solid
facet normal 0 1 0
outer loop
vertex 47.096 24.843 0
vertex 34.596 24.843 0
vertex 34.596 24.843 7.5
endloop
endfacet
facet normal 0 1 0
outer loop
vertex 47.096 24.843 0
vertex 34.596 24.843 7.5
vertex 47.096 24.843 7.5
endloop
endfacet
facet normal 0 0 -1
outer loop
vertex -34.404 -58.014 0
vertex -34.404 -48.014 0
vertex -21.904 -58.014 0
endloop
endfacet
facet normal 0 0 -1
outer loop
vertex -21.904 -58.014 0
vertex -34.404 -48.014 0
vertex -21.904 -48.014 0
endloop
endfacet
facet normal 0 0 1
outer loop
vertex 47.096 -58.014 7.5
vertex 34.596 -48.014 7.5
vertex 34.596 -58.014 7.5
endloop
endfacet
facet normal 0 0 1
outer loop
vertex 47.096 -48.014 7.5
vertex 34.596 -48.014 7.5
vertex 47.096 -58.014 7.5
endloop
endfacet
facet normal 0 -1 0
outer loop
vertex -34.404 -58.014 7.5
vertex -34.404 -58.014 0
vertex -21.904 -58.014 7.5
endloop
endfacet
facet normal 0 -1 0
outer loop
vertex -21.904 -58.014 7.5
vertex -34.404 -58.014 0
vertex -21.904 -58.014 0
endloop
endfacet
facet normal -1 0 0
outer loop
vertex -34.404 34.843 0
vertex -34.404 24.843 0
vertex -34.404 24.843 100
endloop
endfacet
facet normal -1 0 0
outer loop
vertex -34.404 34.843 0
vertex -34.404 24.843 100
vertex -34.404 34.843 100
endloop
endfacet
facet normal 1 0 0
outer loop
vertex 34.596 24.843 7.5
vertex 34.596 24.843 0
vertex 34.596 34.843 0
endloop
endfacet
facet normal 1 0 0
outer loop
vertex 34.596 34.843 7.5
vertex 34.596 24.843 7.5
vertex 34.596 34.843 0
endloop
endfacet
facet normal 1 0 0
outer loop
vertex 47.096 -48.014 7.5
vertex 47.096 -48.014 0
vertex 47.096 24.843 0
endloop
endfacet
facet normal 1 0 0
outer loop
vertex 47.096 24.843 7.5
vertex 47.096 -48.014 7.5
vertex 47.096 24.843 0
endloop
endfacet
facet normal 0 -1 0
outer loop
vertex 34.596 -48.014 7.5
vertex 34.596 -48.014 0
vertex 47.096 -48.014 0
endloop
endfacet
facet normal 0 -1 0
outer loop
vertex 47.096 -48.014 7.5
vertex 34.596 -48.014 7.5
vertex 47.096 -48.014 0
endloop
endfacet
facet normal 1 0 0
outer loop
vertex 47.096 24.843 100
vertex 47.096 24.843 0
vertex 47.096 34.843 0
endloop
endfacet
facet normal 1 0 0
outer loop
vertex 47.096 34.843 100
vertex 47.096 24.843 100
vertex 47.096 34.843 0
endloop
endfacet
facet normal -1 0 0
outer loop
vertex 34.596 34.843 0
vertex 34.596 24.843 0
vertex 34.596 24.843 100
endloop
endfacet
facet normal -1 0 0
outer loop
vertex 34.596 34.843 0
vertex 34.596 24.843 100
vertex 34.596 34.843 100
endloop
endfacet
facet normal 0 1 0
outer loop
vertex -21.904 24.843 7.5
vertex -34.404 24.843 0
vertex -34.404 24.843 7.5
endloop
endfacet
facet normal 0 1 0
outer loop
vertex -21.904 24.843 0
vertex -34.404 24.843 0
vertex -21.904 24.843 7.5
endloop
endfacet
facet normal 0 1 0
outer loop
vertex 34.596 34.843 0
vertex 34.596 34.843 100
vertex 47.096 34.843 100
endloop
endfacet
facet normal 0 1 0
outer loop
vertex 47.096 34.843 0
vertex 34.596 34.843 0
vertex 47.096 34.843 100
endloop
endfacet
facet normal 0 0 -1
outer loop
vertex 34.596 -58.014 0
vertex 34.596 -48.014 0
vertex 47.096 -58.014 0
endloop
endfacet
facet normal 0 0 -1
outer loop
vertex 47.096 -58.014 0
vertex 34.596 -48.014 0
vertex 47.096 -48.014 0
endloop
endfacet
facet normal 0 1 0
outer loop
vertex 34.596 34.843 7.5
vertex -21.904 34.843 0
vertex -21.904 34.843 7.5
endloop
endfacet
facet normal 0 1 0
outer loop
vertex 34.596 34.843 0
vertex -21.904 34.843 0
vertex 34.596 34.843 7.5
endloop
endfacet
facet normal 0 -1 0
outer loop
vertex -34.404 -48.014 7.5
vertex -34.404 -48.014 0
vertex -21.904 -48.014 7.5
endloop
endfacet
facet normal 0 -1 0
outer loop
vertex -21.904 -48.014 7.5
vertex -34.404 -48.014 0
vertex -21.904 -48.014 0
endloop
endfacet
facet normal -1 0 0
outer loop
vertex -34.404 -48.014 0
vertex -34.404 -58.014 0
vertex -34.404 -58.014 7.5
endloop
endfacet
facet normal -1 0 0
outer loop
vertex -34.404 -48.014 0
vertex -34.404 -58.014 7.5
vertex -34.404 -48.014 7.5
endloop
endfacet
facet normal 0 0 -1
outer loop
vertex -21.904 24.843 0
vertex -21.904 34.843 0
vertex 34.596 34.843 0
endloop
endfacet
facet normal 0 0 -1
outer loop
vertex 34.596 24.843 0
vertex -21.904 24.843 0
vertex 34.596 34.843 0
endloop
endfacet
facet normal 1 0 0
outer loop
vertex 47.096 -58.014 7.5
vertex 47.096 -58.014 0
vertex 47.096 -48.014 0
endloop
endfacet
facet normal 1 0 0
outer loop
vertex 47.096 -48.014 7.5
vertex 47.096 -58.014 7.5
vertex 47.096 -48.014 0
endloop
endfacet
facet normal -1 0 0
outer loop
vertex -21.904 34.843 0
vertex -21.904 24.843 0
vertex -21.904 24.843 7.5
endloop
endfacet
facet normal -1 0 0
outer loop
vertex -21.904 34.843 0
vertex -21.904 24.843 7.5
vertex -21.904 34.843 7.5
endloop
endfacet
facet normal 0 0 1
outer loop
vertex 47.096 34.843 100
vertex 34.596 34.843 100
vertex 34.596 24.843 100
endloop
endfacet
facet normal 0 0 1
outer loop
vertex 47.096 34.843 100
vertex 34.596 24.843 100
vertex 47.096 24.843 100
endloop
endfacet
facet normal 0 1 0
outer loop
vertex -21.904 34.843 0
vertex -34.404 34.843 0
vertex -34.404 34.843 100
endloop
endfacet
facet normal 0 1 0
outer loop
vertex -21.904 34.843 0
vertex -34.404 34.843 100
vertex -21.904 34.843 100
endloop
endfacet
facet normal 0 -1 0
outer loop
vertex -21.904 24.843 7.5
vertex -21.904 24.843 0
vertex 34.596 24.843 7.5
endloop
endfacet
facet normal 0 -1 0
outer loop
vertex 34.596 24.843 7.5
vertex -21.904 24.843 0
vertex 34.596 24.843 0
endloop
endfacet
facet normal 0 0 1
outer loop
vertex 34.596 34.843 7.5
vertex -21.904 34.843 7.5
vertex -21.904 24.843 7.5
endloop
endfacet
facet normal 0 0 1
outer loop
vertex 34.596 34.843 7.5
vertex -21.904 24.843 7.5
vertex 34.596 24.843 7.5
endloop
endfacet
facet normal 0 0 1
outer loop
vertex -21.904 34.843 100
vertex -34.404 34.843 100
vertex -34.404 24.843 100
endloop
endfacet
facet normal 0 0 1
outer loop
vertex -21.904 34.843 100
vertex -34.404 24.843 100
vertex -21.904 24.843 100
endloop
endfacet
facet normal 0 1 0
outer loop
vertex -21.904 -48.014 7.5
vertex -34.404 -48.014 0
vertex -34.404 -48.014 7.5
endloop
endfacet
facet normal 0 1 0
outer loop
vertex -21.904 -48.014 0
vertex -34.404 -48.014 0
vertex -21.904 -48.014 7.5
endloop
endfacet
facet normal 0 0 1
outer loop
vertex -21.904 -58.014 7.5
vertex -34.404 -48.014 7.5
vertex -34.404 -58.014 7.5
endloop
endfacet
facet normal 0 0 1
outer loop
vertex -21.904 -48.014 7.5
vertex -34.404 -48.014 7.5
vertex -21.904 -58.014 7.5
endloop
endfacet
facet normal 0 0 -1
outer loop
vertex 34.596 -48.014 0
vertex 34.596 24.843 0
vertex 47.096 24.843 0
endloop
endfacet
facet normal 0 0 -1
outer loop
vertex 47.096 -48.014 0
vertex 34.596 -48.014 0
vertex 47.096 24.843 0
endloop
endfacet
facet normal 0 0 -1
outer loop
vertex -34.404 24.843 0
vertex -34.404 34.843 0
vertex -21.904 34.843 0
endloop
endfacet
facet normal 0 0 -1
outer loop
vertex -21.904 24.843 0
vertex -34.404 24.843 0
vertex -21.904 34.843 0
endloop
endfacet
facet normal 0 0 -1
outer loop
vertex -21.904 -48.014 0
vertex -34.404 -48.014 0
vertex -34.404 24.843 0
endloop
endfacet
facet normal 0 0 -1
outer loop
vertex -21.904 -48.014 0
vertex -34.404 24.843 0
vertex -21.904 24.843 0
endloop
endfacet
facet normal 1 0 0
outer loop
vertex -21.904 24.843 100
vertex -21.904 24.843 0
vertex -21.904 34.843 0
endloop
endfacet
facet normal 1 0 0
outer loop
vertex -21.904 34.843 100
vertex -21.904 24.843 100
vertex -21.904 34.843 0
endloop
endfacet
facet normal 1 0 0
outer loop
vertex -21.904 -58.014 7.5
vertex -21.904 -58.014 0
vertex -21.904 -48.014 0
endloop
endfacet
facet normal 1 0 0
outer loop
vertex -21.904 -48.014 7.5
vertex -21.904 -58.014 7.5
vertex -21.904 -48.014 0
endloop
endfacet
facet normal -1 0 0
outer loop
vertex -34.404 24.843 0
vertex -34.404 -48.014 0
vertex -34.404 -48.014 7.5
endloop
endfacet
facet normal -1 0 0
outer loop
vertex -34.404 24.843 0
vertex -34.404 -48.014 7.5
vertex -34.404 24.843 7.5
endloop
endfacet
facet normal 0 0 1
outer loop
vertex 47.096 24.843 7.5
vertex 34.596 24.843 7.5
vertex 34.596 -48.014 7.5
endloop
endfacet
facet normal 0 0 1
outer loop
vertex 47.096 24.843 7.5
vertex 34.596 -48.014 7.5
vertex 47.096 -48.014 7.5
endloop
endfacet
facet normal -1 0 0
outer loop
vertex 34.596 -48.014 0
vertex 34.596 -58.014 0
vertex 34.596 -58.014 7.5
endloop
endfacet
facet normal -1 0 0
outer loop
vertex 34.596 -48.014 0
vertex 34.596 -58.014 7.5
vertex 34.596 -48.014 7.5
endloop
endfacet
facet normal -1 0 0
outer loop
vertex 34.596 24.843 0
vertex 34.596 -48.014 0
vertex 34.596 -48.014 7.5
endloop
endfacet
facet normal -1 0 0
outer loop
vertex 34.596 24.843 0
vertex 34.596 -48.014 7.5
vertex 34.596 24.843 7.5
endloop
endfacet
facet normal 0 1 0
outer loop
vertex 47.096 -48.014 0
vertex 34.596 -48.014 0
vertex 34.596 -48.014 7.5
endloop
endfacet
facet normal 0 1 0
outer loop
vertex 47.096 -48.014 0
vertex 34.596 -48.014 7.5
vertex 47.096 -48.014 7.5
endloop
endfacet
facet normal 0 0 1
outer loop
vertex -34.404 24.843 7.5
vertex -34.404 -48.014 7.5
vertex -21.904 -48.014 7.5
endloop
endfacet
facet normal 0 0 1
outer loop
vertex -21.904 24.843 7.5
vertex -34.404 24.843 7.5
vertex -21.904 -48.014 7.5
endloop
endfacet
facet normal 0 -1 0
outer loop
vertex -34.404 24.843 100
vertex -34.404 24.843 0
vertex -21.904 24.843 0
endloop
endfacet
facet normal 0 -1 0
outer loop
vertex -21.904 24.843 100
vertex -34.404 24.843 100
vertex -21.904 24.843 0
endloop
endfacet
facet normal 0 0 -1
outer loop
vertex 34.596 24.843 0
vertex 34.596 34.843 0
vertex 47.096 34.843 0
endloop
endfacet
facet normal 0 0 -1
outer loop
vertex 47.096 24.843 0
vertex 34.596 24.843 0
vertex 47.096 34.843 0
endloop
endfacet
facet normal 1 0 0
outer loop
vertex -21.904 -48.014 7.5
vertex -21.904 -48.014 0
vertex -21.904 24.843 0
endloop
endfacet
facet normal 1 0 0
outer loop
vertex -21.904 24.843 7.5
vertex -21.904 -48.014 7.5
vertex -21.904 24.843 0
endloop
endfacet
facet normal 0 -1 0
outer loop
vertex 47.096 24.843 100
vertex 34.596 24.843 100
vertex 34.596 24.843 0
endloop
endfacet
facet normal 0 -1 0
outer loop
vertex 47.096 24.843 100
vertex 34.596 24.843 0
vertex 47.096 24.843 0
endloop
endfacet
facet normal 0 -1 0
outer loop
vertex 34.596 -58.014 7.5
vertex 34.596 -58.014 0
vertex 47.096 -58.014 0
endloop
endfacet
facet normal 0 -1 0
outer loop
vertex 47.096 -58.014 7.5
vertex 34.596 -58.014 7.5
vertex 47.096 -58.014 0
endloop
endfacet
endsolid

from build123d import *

# Parameters (mm, degrees)
F0_W     = 12.5
F0_H     = 10
F1_DEPTH = 100
F0_H_2   = 72.857127
F0_W_2   = 56.5
F2_DEPTH = 7.5
F0_H_3   = 9.999994
F3_DEPTH = 7.5


with BuildPart() as f1:
    # F0 (on Top) → F1 (new body)
    with BuildSketch(Plane.XY):
        with Locations((-28.153578, 29.843405)):
            Rectangle(F0_W, F0_H)
        with Locations((40.846422, 29.843405)):
            Rectangle(F0_W, F0_H)
    extrude(amount=F1_DEPTH)


with BuildPart() as f2:
    # F0 (on Top) → F2 (new body)
    with BuildSketch(Plane.XY):
        with Locations((-28.153578, -11.585159)):
            Rectangle(F0_W, F0_H_2)
        with Locations((40.846422, -11.585159)):
            Rectangle(F0_W, F0_H_2)
        with Locations((6.346422, 29.843405)):
            Rectangle(F0_W_2, F0_H)
    extrude(amount=F2_DEPTH)


with BuildPart() as f3:
    # F0 (on Top) → F3 (new body)
    with BuildSketch(Plane.XY):
        with Locations((-28.153578, -53.013719)):
            Rectangle(F0_W, F0_H_3)
        with Locations((40.846422, -53.013719)):
            Rectangle(F0_W, F0_H_3)
    extrude(amount=F3_DEPTH)


solid = Compound([f1.part, f2.part, f3.part])
